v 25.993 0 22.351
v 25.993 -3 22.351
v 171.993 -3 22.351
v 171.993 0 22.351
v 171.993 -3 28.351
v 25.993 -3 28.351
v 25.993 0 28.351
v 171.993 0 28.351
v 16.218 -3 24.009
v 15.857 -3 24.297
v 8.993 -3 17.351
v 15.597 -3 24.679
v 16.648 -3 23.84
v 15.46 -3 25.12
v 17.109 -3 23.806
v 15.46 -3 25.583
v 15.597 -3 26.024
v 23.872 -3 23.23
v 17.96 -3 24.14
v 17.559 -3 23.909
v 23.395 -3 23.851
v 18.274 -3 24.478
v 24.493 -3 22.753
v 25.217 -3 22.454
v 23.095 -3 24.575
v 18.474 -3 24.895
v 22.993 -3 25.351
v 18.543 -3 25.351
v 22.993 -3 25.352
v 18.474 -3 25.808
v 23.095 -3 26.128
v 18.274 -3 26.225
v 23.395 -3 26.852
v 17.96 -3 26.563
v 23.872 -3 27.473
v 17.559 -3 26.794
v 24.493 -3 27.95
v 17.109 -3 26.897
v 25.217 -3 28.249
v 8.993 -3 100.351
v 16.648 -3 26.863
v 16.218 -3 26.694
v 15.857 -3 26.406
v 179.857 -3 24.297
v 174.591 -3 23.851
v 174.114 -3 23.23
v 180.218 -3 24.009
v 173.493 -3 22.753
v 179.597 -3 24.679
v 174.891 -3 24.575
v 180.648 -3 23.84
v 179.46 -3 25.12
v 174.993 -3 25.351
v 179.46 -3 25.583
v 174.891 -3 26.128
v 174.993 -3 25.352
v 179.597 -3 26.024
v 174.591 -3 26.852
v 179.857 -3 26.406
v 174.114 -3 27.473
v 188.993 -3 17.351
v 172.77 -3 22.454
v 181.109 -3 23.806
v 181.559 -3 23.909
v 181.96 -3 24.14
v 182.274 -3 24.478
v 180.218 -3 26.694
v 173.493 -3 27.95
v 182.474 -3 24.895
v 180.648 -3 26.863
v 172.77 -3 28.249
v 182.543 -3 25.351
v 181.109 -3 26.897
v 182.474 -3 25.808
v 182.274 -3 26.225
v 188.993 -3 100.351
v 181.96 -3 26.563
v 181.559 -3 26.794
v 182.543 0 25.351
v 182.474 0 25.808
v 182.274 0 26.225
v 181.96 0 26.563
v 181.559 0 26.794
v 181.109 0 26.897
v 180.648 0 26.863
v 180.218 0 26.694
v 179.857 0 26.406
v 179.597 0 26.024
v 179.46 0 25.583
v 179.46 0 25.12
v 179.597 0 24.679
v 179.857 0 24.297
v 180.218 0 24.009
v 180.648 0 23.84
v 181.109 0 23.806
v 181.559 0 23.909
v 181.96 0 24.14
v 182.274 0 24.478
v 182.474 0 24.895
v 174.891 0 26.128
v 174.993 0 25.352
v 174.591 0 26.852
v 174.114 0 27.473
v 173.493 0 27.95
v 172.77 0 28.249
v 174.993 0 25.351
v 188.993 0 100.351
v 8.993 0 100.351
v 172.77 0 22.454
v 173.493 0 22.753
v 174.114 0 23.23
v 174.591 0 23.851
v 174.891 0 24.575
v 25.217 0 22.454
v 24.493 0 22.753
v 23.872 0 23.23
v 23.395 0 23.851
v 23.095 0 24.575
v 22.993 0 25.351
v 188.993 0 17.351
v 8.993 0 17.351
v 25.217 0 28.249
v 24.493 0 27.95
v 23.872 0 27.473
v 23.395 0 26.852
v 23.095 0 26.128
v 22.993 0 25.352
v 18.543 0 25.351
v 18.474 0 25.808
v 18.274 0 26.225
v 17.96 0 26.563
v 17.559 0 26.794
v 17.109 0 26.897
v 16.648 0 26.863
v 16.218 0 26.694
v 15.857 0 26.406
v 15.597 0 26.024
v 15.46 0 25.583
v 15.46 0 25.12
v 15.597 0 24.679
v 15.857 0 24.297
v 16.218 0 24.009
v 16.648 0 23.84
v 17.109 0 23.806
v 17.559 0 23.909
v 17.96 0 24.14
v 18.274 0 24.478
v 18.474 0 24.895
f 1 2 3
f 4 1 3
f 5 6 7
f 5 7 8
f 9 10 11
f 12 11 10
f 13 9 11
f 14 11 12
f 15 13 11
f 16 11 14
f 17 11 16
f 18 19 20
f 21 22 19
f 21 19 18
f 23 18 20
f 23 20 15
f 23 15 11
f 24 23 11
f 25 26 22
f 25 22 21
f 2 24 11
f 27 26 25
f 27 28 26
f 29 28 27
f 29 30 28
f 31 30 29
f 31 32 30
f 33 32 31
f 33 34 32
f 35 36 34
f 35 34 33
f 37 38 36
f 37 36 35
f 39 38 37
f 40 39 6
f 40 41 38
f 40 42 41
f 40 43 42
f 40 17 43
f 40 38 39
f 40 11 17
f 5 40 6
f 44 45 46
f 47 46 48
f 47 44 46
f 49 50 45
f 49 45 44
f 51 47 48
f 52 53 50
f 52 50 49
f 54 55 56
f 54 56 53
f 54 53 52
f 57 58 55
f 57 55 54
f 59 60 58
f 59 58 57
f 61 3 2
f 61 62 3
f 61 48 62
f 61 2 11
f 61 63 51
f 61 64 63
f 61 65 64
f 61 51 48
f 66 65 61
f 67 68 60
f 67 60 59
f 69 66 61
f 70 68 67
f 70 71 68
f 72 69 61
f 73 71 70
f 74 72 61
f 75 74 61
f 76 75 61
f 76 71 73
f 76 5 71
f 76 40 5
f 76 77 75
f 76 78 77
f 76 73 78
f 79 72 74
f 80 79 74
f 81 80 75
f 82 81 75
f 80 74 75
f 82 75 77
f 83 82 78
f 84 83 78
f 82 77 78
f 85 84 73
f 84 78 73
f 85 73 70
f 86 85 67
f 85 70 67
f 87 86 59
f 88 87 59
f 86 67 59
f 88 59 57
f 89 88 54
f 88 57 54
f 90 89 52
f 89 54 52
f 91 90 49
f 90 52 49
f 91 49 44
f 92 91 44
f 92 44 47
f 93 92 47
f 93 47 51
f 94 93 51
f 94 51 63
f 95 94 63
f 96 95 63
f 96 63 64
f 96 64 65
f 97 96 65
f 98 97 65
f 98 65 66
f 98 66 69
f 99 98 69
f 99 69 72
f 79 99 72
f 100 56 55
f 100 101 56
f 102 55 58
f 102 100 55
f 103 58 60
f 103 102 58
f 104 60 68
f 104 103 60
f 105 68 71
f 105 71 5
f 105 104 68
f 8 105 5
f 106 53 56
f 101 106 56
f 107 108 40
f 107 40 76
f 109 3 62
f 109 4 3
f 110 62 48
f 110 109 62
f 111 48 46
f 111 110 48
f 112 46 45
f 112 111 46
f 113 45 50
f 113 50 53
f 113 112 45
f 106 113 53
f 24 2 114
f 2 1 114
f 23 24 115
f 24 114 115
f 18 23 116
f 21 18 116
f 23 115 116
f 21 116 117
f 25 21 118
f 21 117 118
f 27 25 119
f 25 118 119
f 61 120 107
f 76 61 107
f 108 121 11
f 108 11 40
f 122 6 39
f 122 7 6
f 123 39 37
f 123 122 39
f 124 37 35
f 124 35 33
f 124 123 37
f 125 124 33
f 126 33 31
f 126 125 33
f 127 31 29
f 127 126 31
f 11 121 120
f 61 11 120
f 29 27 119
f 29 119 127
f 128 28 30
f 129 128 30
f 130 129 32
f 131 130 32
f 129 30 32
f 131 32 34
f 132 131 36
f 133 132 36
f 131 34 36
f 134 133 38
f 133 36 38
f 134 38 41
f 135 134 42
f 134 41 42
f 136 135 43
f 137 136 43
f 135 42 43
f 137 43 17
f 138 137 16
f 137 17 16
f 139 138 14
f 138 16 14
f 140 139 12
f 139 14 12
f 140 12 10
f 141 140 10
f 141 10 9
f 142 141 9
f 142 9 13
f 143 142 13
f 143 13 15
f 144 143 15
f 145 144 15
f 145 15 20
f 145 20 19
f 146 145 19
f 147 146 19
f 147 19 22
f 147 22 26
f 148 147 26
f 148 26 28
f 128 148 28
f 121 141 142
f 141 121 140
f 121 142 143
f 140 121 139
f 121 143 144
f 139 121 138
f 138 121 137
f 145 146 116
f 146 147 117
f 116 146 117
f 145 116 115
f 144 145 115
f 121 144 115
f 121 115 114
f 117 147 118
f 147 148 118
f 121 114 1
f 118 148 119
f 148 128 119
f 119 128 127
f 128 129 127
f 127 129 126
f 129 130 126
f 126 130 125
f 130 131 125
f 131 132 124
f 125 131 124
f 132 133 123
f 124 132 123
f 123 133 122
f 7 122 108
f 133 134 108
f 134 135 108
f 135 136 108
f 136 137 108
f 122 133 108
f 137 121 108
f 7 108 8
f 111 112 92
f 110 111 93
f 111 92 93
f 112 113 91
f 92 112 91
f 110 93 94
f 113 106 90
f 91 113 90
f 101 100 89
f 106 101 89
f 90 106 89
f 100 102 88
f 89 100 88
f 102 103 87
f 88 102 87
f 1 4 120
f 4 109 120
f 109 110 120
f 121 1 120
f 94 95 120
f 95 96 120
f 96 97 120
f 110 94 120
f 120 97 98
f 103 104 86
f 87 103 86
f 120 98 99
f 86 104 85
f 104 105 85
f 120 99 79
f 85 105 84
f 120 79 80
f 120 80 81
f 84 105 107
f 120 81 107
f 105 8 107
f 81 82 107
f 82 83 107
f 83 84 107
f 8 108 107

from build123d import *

# Parameters (mm, degrees)
F0_W     = 180
F0_H     = 83
F1_DEPTH = 3
F2_R     = 1.55
F2_W     = 152
F2_H     = 6
F3_DEPTH = 25
F4_R     = 2.99999


# Not quite as in the source:
# - a fillet or chamfer is up to 0.001 mm smaller than in the source, because OpenCascade refuses the exact size


with BuildPart() as f1:
    # F0 (on Front) → F1 (new body)
    with BuildSketch(Plane.XZ):
        with Locations((98.9931351204, 58.851495102)):
            Rectangle(F0_W, F0_H)
    extrude(amount=F1_DEPTH)

    # F2 (on face) → F3 (cut)
    with BuildSketch(Plane.XZ.offset(3)):
        with Locations((180.9931351204, 25.351495102)):
            Circle(F2_R)
        with Locations((98.9931351204, 25.351495102)):
            Rectangle(F2_W, F2_H)
        with Locations((16.9931351204, 25.351495102)):
            Circle(F2_R)
    extrude(amount=-F3_DEPTH, mode=Mode.SUBTRACT)

    # F4 (radius 3 in the source; OpenCascade refuses exactly that, so slightly less here)
    f4_edges = [f1.edges().sort_by_distance(p)[0] for p in [
        (22.993135, -1.5, 28.351495),
        (22.993135, -1.5, 22.351495),
        (174.993135, -1.5, 28.351495),
        (174.993135, -1.5, 22.351495),
    ]]
    fillet(f4_edges, radius=F4_R)


solid = f1.part
